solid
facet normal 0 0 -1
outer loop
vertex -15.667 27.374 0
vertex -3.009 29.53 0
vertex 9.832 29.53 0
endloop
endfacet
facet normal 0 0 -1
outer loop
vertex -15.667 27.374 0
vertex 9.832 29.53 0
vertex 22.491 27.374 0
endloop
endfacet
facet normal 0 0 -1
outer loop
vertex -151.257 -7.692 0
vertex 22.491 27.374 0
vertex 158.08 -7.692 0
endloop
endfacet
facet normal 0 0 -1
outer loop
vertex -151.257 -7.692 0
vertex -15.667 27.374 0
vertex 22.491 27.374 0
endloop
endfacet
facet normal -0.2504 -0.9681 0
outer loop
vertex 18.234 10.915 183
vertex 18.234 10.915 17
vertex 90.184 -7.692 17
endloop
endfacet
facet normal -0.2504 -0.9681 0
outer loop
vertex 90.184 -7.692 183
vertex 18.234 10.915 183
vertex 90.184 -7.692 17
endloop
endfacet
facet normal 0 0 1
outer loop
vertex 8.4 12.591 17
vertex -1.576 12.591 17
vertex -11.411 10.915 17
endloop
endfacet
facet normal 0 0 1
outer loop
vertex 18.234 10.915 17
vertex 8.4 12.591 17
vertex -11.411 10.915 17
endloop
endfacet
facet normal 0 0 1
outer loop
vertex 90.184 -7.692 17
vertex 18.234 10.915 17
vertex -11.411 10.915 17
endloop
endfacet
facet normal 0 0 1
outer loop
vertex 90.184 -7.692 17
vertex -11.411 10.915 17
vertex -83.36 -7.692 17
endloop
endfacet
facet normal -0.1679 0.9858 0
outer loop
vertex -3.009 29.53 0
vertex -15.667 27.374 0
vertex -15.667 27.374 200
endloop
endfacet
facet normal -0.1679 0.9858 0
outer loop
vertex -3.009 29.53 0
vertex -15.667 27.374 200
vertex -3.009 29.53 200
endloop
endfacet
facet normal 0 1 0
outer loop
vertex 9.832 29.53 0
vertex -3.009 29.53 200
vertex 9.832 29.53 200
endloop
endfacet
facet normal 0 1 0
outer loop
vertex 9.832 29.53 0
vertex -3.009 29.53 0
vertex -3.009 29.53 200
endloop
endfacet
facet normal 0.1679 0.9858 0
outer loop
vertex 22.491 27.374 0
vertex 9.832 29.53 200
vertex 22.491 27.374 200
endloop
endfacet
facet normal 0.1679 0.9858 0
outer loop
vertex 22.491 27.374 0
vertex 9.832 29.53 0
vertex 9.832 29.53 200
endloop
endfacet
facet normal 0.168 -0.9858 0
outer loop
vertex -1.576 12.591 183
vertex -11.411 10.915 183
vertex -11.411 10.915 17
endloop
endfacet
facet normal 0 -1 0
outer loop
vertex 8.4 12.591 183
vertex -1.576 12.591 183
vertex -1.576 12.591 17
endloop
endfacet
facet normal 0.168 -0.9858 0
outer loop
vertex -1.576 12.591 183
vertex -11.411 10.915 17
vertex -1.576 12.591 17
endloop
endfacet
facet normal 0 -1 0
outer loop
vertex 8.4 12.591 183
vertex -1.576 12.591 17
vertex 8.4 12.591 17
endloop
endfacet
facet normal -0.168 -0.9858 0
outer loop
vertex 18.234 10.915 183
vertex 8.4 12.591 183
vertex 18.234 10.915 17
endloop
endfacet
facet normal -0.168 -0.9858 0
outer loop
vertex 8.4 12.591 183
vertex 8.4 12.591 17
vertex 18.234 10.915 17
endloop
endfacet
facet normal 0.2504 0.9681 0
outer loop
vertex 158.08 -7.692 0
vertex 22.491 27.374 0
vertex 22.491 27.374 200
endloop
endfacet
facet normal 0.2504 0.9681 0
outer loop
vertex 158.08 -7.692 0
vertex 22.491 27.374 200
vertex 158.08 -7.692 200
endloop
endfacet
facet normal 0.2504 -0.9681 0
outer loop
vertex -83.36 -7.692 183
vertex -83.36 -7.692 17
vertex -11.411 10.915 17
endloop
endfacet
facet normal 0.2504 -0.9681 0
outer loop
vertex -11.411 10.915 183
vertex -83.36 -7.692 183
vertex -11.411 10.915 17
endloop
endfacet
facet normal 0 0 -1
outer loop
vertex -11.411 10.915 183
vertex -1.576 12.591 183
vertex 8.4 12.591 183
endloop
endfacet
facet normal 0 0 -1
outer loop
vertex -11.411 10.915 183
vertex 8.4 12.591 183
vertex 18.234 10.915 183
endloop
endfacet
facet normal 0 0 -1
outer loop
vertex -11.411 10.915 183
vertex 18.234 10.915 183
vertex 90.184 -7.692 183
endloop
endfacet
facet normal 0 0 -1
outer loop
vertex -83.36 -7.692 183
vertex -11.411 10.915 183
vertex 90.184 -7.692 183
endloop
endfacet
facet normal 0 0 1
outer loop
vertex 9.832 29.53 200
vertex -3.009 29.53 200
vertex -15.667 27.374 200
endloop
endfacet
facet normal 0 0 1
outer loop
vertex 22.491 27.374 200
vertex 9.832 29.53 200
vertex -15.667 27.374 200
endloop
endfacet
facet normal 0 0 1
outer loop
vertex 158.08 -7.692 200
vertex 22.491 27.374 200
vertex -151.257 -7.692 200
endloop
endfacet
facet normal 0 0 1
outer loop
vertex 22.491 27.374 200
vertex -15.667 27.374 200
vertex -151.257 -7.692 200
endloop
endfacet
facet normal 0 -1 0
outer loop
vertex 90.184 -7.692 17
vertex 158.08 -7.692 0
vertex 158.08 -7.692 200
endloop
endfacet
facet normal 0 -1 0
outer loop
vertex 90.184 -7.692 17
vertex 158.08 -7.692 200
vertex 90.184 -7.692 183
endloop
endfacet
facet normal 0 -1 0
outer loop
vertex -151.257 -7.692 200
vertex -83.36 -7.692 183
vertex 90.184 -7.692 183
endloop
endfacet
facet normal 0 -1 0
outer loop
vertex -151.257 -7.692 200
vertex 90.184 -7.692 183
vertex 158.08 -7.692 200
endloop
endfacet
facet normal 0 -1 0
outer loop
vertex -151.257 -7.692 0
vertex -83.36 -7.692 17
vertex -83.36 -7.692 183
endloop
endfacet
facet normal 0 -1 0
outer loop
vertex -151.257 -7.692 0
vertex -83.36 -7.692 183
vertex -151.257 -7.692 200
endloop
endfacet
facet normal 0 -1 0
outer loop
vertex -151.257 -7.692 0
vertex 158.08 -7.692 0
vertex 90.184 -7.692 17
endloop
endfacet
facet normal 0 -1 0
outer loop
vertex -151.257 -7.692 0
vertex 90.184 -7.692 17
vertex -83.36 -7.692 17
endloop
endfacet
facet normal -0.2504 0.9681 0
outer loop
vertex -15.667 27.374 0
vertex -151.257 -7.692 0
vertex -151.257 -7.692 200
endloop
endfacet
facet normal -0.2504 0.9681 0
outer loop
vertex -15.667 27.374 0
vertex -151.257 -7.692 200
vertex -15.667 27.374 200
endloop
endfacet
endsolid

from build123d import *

# Parameters (mm, degrees)
BOSS_EXTRUDE1_DEPTH = 200
SHELL1_T            = -17


with BuildPart() as part:
    # Sketch1 → Boss-Extrude1 (new body)
    with BuildSketch(Plane.XY):
        with BuildLine():
            Line((-151.256685576, -7.691916928), (-15.667118089, 27.373929479))
            ThreePointArc((-15.667118089, 27.373929479), (3.41183822, 29.801079282), (22.490794529, 27.373929479))
            Line((22.490794529, 27.373929479), (158.080362016, -7.691916928))
            Line((158.080362016, -7.691916928), (-151.256685576, -7.691916928))
        make_face()
    extrude(amount=BOSS_EXTRUDE1_DEPTH)

    # Shell1
    shell1_openings = [part.faces().sort_by_distance(p)[0] for p in [
        (3.41183822, -7.691916928, 100),
    ]]
    offset(amount=SHELL1_T, openings=shell1_openings, kind=Kind.INTERSECTION)


solid = part.part
